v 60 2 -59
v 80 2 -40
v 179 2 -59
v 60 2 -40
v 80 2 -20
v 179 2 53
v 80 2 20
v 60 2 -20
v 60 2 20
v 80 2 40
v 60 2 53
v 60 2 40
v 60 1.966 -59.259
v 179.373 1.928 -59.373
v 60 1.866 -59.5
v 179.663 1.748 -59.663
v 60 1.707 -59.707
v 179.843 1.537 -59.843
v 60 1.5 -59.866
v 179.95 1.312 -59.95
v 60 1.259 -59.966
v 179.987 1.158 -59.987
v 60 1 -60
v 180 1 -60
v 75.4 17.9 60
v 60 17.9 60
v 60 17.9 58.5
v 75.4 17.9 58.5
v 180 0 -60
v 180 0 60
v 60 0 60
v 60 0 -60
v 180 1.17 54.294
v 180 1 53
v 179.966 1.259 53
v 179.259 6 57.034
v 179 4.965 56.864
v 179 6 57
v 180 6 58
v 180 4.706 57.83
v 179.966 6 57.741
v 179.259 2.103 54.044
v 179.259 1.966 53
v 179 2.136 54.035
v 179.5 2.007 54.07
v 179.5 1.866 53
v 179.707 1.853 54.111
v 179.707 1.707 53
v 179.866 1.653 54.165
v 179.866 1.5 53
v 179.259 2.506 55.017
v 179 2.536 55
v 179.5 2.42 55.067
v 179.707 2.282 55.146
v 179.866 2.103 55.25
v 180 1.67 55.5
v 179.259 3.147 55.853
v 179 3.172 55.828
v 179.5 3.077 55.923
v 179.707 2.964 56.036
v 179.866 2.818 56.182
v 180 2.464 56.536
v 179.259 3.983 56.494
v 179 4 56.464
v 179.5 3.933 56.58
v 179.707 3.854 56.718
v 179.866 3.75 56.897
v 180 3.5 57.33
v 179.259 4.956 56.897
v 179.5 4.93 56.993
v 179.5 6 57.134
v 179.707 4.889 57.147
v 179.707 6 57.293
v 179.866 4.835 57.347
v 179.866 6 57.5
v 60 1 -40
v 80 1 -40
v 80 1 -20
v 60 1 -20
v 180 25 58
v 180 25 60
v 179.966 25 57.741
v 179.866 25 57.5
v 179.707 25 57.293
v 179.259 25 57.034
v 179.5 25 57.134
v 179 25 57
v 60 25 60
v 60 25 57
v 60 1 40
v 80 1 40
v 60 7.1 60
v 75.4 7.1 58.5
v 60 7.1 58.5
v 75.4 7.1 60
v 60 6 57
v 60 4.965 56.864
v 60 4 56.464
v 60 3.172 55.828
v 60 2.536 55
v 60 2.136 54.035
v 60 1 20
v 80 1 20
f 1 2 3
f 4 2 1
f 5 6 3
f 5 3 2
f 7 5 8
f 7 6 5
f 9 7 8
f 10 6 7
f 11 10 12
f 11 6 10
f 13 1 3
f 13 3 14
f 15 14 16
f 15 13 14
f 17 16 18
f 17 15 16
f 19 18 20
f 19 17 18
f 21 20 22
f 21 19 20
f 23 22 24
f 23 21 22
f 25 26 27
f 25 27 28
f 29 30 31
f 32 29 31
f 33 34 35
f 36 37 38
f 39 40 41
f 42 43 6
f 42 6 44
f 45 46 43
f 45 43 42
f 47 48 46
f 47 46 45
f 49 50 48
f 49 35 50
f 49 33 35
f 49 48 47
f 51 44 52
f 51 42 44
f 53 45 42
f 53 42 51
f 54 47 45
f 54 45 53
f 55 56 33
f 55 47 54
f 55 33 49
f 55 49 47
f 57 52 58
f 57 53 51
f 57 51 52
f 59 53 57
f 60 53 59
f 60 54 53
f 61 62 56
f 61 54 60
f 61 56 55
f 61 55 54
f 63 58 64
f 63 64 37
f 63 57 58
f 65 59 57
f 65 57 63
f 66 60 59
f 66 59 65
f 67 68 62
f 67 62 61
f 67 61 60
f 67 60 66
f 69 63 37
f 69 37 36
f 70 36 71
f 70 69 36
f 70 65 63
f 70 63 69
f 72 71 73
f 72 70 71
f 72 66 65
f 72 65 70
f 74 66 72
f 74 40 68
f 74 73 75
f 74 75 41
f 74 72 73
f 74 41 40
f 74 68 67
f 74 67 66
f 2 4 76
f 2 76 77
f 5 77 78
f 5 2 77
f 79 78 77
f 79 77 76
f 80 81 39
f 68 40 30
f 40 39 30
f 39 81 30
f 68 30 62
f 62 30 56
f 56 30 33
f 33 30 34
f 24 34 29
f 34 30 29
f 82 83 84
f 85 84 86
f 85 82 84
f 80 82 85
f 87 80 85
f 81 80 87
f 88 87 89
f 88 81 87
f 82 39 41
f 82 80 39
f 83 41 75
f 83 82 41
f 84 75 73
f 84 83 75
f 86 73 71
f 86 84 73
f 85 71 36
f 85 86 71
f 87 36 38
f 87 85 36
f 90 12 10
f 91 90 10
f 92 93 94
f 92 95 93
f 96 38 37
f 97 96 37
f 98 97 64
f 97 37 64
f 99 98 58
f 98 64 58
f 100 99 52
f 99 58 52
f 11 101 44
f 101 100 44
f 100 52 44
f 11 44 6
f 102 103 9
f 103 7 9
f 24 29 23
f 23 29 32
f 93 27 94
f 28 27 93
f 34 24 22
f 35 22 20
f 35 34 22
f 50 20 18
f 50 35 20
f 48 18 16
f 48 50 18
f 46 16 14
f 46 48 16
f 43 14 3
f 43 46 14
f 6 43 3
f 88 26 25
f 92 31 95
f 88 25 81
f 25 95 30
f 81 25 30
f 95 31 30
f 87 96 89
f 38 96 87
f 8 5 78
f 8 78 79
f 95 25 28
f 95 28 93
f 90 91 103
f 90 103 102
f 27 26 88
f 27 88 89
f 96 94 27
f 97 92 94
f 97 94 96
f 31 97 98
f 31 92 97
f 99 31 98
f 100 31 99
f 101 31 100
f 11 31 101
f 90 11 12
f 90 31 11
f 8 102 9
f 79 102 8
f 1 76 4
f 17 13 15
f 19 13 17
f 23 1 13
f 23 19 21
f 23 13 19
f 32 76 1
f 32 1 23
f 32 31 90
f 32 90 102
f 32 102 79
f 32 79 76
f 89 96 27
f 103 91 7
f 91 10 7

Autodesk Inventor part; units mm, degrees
ref_plane "YZ Plane" through (0, 0, 0) normal (1, 0, 0) x (0, 1, 0)
ref_plane "XZ Plane" through (0, 0, 0) normal (0, 1, 0) x (-1, 0, 0)
ref_plane "XY Plane" through (0, 0, 0) normal (0, 0, 1) x (1, 0, 0)
sketch "スケッチ1" plane through (0, 0, 0) normal (0, 1, 0) x (-1, 0, 0)
  line L0 (180, 60) -> (-180, 60)
  line L1 (-180, 60) -> (-180, -60)
  line L2 (-180, -60) -> (180, -60)
  line L3 (180, -60) -> (180, 60)
  line L4 (180, 60) -> (-180, -60) construction
  line L5 (-180, 60) -> (180, -60) construction
  line L6 (180, 57) -> (-180, 57)
  line L7 (-60, 60) -> (-60, -60)
  line L8 (-60, 40) -> (-80, 40)
  line L9 (-80, 40) -> (-80, 20)
  line L10 (-80, 20) -> (-60, 20)
  line L11 (252, 0) -> (-252, 0) construction
  line L12 (-60, -40) -> (-80, -40)
  line L13 (-80, -40) -> (-80, -20)
  line L14 (-80, -20) -> (-60, -20)
  line L15 (0, -84) -> (0, 84) construction
  line L16 (60, 60) -> (60, -60)
  line L17 (60, 40) -> (80, 40)
  line L18 (80, 40) -> (80, 20)
  line L19 (80, 20) -> (60, 20)
  line L20 (60, -40) -> (80, -40)
  line L21 (80, -20) -> (60, -20)
  line L22 (80, -40) -> (80, -20)
  line L23 (-60, 19.7) -> (-80.3, 19.7)
  line L24 (-80.3, 19.7) -> (-80.3, 40.3)
  line L25 (-80.3, 40.3) -> (-60, 40.3)
  line L26 (-60, -19.7) -> (-80.3, -19.7)
  line L27 (-80.3, -19.7) -> (-80.3, -40.3)
  line L28 (-80.3, -40.3) -> (-60, -40.3)
  line L29 (60, 19.7) -> (80.3, 19.7)
  line L30 (80.3, 19.7) -> (80.3, 40.3)
  line L31 (80.3, 40.3) -> (60, 40.3)
  line L32 (60, -19.7) -> (80.3, -19.7)
  line L33 (80.3, -19.7) -> (80.3, -40.3)
  line L34 (80.3, -40.3) -> (60, -40.3)
  point P0 (0, 0)
  point P1 (-60, 57)
  dimension "d0" = 120
  dimension "d1" = 360
  dimension "d4" = 3
  dimension "d5" = 120
  dimension "d7" = 20
  dimension "d8" = 20
  dimension "d9" = 20
  dimension "d10" = 0.3
  dimension "d11" = 0.3
extrude "押し出し3" add sketch "スケッチ1" along normal blind 25 contours L3 L6 L16 L0 | L16 L6 L7 L0 | L7 L6 L1 L0
extrude "押し出し1" add sketch "スケッチ1" along normal blind 2 contours L7 L6 L1 L0 | L7 L25 L24 L23 L26 L27 L28 L2 L1 L6 | L7 L8 L9 L10 L23 L24 L25 | L7 L10 L9 L8 | L28 L27 L26 L7 L14 L13 L12 | L12 L13 L14 L7
extrude "押し出し2" cut sketch "スケッチ1" against normal blind 1 from surface at 2 contours L7 L10 L9 L8 | L12 L13 L14 L7
sketch "スケッチ2" plane through (-180, 0, 60) normal (0, 0, 1) x (1, 0, 0)
  line L0 (0, 0) -> (360, 0) projected
  line L1 (360, 0) -> (360, 25) projected
  line L2 (0, 25) -> (360, 25) projected
  line L3 (0, 0) -> (0, 25) projected
  line L4 (240, 0) -> (240, 25)
  line L5 (240, 7.5) -> (255, 7.5)
  line L6 (255, 7.5) -> (255, 17.5)
  line L7 (255, 17.5) -> (240, 17.5)
  line L8 (180, -5) -> (180, 30) construction
  line L9 (120, 0) -> (120, 25)
  line L10 (120, 7.5) -> (105, 7.5)
  line L11 (105, 7.5) -> (105, 17.5)
  line L12 (105, 17.5) -> (120, 17.5)
  line L13 (240, 17.9) -> (255.4, 17.9)
  line L14 (255.4, 17.9) -> (255.4, 7.1)
  line L15 (255.4, 7.1) -> (240, 7.1)
  line L16 (120, 17.9) -> (104.6, 17.9)
  line L17 (104.6, 17.9) -> (104.6, 7.1)
  line L18 (104.6, 7.1) -> (120, 7.1)
  point P0 (180, 0)
  point P1 (360, 12.5)
  dimension "d16" = 120
  dimension "d17" = 10
  dimension "d18" = 15
  dimension "d19" = 7.5
  dimension "d24" = 0.4
extrude "押し出し4" cut sketch "スケッチ2" against normal blind 25 contours L3 L2 L9 L16 L17 L18 L0 | L9 L2 L4 L0 | L18 L17 L16 L9 L12 L11 L10 | L10 L11 L12 L9
extrude "押し出し5" cut sketch "スケッチ2" against normal blind 1.5 contours L4 L5 L6 L7 L13 L14 L15 | L4 L7 L6 L5
fillet "フィレット2" radius 4 1 edges at (120, 2, 57)
fillet "フィレット3" radius 1 3 edges at (180, 15.5, 57) (180, 2, -3.5) (120, 2, -60)
properties part number "protectar1"
